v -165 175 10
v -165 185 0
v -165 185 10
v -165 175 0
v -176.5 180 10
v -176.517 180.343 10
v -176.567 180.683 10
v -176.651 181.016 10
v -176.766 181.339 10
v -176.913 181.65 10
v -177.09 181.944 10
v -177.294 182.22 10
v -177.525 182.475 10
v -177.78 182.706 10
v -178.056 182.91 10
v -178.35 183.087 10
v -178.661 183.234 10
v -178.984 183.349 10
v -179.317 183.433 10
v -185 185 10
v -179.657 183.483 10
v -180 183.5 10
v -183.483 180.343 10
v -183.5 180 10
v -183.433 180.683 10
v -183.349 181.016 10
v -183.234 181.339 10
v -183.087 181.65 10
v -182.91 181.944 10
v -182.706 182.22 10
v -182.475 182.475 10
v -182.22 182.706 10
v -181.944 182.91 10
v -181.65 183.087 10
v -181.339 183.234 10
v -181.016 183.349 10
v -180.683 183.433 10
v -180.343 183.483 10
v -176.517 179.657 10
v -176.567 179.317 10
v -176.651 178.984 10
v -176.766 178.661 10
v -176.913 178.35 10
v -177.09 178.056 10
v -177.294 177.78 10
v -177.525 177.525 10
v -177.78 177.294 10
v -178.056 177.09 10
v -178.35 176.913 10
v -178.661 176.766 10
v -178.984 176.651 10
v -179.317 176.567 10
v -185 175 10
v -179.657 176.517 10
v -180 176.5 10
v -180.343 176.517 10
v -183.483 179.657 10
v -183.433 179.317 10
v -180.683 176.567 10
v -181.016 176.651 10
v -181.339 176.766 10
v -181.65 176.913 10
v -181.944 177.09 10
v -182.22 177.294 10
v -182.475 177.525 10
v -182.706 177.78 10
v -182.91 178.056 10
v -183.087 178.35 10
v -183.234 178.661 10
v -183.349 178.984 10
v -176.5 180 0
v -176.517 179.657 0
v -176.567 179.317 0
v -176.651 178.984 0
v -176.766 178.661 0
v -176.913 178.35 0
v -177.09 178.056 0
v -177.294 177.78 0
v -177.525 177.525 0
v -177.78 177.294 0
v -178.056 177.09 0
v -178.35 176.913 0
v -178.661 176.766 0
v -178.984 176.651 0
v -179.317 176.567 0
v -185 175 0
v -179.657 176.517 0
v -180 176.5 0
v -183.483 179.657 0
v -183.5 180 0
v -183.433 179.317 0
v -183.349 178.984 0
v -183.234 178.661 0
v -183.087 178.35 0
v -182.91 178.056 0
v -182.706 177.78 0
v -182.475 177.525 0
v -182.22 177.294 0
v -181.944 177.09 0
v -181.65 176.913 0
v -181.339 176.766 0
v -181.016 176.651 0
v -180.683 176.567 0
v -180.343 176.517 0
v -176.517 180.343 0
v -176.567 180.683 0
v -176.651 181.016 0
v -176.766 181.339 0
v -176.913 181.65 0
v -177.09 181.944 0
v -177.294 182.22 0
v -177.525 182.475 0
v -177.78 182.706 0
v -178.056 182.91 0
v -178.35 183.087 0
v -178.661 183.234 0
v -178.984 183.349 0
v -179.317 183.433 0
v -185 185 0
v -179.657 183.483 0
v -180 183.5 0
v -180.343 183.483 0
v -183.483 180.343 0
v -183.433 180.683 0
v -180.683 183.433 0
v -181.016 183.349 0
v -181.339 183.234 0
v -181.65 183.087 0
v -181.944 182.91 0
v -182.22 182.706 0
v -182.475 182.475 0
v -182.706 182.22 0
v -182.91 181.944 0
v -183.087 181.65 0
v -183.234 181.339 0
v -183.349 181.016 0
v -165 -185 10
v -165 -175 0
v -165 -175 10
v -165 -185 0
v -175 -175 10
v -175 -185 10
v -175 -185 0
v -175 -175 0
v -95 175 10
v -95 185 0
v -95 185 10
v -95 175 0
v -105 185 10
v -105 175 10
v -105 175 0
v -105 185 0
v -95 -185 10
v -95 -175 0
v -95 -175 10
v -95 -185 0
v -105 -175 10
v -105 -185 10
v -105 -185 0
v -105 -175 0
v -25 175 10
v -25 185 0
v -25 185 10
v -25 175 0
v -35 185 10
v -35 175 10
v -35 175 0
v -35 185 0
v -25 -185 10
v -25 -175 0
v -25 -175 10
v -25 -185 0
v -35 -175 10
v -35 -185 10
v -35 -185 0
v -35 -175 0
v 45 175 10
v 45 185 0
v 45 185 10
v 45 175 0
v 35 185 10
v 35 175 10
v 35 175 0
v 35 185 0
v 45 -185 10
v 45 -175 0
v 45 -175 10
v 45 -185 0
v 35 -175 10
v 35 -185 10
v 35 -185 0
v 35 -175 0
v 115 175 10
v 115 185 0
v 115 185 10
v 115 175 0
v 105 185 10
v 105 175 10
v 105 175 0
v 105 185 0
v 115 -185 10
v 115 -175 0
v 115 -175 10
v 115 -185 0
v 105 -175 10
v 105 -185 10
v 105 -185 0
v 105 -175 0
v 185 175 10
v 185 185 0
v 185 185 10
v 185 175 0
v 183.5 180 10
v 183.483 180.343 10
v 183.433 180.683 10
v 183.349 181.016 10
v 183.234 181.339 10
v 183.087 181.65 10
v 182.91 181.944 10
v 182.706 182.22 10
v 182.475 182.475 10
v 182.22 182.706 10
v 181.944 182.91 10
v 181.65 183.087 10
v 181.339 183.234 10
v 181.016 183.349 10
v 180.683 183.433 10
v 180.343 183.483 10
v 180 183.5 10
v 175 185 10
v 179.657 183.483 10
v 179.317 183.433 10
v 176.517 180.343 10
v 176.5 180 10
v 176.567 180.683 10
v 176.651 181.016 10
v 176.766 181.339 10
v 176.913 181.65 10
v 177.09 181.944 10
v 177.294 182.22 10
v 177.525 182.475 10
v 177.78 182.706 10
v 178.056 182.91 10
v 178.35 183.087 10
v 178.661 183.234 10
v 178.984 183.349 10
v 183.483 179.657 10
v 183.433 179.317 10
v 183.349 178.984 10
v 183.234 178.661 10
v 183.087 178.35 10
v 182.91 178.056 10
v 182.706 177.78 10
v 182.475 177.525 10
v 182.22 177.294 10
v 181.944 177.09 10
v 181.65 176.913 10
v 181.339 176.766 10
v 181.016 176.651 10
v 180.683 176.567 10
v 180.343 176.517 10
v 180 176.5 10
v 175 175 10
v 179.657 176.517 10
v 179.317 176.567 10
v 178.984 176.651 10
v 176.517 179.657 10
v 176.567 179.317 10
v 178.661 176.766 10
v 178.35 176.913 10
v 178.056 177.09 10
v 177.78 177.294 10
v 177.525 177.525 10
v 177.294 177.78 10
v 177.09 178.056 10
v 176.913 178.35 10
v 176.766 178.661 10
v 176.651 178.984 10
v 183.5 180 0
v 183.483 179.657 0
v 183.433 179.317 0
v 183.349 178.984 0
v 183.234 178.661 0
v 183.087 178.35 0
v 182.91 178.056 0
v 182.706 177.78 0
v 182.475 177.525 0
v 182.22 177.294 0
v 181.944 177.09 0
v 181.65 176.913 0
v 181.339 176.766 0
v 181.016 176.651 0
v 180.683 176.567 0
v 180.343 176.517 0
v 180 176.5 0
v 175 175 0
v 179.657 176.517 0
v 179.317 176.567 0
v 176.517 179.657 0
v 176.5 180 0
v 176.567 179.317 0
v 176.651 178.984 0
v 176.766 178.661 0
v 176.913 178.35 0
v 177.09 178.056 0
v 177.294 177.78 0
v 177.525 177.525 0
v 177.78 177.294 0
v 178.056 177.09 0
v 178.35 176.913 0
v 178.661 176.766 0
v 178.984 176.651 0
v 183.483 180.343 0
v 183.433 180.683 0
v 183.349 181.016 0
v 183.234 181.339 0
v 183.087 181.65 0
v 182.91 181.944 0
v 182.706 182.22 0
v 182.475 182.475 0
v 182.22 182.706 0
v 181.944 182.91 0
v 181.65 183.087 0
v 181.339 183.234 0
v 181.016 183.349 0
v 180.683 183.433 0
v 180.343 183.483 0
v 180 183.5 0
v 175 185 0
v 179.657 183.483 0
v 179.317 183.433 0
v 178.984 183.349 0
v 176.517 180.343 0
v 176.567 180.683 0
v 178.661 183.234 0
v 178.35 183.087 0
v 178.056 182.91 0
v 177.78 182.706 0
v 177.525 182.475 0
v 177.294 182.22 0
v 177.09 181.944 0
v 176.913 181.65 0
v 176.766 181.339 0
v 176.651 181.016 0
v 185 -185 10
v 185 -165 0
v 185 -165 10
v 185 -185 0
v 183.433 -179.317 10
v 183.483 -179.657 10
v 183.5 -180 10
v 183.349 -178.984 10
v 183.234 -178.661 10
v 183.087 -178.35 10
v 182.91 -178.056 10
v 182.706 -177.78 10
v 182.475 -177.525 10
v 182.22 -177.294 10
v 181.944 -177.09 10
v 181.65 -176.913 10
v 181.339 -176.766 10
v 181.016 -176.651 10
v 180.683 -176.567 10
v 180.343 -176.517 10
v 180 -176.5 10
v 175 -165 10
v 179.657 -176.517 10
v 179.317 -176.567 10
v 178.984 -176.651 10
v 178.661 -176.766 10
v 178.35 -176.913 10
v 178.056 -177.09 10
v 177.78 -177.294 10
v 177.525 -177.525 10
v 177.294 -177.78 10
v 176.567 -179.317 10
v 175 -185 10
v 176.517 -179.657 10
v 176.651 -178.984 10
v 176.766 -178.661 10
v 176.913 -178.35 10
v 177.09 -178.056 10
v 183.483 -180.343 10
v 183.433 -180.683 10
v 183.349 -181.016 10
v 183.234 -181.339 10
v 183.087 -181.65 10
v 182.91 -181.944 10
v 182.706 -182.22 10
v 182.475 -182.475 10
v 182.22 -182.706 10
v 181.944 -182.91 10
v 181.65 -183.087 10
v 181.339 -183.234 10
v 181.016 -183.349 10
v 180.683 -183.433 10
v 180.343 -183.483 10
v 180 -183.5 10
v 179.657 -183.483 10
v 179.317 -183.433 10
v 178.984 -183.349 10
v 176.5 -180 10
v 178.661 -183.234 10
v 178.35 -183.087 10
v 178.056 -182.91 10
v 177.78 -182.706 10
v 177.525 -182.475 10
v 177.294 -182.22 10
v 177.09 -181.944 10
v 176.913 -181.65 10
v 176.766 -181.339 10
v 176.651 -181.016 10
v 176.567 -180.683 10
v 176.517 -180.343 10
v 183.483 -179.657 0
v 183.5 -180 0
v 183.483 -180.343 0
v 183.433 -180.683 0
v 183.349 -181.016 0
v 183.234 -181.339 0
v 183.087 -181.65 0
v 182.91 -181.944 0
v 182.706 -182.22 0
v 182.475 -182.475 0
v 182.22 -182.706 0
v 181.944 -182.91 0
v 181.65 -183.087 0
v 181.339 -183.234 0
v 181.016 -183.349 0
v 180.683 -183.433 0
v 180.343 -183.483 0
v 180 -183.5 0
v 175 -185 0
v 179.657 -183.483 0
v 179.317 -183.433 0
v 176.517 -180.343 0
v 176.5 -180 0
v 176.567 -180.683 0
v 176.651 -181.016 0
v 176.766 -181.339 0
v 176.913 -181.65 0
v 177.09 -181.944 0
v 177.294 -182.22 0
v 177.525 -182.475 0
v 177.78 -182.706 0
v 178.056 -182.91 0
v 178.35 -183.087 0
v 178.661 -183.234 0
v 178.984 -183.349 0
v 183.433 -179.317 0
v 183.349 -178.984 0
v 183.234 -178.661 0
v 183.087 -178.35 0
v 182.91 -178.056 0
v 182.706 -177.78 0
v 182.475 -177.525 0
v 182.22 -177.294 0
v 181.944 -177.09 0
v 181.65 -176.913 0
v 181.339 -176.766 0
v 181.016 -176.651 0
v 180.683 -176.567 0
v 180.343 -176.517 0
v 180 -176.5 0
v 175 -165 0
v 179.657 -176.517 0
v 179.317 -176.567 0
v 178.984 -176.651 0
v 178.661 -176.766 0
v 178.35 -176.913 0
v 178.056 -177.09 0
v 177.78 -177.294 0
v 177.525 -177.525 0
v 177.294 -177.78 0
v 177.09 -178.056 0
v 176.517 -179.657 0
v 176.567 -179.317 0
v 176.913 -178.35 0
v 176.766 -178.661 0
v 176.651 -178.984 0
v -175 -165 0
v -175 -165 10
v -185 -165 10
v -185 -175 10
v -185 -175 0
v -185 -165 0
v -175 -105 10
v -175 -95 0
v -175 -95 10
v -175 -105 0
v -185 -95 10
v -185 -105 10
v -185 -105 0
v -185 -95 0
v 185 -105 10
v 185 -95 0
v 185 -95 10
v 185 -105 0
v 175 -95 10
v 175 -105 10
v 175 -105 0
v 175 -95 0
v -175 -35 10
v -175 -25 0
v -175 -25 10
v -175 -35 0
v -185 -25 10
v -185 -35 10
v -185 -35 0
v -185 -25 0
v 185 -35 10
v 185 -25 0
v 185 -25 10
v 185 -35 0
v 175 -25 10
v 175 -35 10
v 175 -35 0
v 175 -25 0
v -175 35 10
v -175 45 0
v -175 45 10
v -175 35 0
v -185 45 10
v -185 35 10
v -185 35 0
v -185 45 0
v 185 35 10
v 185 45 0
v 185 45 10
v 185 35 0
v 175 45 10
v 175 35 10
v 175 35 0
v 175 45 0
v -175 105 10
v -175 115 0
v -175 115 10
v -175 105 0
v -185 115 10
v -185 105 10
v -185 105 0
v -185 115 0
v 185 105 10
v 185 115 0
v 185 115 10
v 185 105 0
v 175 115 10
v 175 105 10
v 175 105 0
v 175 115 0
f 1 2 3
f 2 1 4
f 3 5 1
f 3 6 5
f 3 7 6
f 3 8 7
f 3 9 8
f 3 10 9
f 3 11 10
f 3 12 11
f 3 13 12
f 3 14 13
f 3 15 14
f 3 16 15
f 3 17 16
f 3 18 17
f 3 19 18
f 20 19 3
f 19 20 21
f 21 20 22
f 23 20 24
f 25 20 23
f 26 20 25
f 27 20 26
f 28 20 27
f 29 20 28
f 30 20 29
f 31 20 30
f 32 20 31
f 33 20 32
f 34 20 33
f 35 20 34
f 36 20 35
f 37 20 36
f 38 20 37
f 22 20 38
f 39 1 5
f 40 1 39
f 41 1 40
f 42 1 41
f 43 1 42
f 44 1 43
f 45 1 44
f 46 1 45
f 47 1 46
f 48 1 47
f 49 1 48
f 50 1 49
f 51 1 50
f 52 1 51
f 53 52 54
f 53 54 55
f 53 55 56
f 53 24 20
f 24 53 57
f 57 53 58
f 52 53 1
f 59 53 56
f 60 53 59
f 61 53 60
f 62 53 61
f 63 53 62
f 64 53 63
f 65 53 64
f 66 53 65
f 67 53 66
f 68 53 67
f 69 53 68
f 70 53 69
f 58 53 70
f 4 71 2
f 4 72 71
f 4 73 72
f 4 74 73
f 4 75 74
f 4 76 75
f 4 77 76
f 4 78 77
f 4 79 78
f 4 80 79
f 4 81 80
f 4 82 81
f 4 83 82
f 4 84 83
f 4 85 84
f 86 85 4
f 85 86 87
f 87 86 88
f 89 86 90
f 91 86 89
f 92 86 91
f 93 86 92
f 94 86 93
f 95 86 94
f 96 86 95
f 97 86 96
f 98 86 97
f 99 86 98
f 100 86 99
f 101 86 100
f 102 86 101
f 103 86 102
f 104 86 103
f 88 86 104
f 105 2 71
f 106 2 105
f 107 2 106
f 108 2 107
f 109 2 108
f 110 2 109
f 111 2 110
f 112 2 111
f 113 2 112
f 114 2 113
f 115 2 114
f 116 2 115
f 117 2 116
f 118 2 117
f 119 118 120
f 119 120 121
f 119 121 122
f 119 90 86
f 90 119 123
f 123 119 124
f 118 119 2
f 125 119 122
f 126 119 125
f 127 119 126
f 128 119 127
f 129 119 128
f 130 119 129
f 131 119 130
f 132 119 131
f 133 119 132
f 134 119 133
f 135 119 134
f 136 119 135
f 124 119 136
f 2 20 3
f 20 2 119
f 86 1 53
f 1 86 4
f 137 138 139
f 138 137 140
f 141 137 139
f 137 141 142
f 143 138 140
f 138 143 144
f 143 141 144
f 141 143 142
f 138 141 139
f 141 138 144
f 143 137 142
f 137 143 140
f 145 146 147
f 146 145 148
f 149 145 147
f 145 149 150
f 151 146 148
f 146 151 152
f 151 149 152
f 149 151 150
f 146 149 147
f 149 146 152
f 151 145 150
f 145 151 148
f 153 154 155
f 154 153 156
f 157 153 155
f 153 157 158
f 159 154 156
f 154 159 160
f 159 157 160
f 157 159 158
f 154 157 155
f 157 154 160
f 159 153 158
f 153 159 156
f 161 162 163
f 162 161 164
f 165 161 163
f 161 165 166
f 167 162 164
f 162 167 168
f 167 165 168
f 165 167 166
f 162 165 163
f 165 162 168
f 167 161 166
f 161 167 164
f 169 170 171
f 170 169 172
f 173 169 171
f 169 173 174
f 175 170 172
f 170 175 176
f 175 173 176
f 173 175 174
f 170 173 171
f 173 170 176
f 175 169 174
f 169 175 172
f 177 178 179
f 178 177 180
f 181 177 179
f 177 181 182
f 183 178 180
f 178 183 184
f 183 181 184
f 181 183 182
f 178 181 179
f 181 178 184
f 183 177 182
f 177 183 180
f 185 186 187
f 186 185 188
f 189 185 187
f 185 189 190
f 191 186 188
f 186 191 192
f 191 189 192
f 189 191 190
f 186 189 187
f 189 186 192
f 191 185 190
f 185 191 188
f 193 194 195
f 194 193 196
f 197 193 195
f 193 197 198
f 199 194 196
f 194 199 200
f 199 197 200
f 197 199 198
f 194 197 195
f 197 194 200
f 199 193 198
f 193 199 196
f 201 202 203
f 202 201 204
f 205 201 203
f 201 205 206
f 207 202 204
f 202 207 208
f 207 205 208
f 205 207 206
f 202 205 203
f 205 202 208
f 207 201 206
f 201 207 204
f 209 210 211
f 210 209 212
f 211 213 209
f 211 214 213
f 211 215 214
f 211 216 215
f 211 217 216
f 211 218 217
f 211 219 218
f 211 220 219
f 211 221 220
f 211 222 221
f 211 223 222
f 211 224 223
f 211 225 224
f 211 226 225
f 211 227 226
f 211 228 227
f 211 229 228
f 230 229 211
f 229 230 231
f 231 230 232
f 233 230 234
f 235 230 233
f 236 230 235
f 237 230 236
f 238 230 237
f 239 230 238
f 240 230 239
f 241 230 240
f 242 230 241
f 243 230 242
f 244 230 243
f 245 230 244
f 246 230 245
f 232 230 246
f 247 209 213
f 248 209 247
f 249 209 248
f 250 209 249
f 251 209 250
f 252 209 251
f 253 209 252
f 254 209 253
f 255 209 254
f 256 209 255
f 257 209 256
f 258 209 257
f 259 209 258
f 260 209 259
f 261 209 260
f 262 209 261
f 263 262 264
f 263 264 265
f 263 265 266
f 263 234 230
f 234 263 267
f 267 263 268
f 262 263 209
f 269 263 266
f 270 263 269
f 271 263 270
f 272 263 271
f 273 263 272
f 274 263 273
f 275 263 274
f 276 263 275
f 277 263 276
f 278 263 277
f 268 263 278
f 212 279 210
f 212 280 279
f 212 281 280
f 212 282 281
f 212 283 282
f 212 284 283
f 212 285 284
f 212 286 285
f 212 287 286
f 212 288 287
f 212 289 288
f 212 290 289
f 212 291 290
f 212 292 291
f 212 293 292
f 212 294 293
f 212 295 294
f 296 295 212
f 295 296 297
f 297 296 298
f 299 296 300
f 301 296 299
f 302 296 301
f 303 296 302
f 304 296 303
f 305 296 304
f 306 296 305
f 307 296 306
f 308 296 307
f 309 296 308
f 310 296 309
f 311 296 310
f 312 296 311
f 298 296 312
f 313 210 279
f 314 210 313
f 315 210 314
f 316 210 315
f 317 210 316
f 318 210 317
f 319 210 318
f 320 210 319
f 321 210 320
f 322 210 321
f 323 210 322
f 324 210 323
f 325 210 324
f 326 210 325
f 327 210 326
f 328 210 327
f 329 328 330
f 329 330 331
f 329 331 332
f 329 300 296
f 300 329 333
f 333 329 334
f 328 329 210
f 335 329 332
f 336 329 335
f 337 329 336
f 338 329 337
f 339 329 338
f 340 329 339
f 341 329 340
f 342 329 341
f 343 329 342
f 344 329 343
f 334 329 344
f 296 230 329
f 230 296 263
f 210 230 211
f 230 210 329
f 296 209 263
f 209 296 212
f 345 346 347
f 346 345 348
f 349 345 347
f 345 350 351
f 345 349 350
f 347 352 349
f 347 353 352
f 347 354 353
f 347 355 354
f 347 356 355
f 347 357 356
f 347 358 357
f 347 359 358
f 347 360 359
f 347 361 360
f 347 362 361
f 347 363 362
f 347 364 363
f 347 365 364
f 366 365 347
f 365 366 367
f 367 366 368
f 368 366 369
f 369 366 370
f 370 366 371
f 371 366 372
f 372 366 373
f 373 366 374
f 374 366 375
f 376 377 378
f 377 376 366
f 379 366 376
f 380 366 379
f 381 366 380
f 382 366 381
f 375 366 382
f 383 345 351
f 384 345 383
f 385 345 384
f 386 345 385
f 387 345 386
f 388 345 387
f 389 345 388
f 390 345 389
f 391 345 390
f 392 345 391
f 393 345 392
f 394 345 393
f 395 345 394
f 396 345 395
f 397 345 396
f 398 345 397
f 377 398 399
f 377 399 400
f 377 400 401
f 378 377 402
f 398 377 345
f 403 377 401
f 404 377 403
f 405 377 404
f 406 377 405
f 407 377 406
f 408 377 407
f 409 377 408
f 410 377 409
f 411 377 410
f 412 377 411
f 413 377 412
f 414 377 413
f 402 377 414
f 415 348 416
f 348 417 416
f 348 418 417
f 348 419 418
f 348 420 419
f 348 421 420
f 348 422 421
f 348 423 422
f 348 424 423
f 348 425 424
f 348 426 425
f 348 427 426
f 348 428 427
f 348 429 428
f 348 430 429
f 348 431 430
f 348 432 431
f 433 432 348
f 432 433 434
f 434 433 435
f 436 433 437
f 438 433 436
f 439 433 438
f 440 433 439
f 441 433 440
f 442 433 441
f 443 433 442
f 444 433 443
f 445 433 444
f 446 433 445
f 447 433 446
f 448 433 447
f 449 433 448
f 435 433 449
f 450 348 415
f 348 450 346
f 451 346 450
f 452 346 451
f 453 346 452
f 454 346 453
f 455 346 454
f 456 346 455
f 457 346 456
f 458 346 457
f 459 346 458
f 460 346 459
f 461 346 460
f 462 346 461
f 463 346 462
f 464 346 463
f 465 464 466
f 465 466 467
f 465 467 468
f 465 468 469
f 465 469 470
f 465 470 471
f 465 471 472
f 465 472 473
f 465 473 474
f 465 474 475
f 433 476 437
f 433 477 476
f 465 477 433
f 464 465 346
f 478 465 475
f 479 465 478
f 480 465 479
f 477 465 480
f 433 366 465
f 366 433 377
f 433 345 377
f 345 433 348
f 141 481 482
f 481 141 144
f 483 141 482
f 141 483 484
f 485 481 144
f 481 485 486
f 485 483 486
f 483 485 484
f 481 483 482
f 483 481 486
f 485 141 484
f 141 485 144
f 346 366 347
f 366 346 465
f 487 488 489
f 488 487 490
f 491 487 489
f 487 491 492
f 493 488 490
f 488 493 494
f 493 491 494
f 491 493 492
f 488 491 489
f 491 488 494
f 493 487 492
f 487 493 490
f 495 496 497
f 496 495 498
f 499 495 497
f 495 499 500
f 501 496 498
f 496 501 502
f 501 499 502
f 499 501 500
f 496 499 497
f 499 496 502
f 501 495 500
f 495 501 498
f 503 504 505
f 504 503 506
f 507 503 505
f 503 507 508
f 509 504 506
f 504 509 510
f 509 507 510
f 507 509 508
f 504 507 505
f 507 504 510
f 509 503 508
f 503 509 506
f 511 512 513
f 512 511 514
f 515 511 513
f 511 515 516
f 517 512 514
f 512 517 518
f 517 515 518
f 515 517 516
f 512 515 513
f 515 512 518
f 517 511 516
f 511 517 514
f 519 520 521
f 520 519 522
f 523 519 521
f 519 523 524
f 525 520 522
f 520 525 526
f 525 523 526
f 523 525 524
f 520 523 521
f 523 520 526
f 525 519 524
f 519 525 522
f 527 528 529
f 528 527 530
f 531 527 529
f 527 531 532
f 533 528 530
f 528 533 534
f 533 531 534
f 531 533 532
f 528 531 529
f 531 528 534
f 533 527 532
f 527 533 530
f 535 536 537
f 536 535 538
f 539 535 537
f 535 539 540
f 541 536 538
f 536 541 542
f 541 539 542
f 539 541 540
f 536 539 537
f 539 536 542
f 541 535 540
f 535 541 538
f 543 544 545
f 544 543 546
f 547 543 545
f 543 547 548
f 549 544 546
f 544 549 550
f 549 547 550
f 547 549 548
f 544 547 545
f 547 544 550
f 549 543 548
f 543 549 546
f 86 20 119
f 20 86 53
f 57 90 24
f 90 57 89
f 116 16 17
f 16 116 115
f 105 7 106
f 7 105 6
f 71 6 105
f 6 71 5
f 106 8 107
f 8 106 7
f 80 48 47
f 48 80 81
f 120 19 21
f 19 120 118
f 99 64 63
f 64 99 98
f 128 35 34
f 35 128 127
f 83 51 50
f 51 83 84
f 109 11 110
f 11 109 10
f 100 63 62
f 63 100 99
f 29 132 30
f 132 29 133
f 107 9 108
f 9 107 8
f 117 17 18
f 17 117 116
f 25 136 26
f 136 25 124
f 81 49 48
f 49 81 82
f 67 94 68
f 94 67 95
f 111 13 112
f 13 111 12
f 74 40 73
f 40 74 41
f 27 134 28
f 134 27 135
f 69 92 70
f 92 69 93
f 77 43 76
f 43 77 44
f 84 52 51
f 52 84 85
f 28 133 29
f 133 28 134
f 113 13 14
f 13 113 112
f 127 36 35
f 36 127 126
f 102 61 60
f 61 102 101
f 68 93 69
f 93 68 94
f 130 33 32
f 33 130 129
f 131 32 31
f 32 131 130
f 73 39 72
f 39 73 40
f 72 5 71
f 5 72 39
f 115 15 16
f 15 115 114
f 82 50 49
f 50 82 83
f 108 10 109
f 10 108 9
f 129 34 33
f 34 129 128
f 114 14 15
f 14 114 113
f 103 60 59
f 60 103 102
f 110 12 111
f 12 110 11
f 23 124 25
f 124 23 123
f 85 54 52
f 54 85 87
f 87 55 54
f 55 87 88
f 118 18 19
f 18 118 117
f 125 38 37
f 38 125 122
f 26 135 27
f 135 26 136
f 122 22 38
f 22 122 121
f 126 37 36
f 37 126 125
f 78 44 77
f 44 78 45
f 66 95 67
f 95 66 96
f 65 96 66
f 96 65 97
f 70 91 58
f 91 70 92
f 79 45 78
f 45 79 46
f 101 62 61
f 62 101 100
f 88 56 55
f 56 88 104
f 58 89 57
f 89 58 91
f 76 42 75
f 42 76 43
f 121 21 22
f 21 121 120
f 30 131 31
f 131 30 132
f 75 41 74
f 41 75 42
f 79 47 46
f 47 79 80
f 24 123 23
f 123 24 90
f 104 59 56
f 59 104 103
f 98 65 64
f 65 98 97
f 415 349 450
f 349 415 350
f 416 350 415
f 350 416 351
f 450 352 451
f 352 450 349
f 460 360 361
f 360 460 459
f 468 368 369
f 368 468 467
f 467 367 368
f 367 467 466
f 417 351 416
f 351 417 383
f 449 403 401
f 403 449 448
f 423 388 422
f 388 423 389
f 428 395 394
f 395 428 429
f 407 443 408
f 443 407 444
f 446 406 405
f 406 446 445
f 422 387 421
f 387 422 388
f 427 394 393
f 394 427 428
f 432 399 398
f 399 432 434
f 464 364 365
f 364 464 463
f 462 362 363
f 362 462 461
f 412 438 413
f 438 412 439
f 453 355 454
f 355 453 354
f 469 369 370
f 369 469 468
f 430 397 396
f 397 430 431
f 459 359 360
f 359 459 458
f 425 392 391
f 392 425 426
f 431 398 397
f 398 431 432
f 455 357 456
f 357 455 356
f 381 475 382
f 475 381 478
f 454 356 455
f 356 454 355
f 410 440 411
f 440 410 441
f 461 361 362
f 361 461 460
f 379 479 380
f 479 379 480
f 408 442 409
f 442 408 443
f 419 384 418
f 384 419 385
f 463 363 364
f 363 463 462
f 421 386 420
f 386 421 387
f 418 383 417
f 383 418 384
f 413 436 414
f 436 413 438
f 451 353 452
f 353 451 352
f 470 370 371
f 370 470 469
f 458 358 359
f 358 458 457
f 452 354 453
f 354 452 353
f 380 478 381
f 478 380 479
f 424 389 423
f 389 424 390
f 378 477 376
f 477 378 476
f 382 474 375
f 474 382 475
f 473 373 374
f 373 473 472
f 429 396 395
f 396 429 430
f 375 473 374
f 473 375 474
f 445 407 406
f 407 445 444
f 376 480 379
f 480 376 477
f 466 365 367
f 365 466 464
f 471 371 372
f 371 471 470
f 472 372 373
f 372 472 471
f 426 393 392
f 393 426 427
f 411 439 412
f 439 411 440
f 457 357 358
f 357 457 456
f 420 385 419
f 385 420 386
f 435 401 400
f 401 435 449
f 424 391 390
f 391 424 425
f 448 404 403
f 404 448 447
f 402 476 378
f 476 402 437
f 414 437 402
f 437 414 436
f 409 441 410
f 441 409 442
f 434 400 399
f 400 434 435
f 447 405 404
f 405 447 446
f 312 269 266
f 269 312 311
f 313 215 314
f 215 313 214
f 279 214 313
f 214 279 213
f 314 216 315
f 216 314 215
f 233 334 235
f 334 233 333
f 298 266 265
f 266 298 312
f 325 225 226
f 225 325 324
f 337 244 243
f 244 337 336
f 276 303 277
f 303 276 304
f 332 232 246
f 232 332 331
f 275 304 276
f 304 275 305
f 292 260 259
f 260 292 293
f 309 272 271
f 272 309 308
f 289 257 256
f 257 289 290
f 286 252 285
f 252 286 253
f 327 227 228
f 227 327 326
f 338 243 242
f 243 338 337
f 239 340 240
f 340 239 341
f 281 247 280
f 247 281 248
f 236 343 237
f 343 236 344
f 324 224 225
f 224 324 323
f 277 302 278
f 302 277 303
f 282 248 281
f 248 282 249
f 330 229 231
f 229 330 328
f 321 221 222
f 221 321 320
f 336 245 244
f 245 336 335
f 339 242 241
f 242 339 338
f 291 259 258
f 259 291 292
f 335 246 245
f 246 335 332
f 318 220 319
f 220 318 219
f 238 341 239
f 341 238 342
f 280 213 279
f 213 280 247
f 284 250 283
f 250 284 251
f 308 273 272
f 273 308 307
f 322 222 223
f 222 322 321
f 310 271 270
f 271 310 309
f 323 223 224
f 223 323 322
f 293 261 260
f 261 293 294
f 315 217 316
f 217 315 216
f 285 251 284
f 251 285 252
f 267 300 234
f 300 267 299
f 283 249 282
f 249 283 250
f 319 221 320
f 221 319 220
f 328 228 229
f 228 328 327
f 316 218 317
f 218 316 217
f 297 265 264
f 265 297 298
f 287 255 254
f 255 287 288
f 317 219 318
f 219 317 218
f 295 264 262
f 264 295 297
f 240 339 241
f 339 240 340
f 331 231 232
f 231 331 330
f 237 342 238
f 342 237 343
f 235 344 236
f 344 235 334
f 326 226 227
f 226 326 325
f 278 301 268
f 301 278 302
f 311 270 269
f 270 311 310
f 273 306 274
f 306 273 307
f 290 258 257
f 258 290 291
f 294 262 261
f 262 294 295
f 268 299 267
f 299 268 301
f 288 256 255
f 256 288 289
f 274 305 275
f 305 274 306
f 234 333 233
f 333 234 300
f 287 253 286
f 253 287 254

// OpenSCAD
// ring_05.scad - ring index 5 (z bottom = 50 mm)
$fn = 64; bar = 10; half_b = bar/2; outer = 370; half_outer = outer/2;
front_y = 180; back_y = -180; left_x = -180; right_x = 180;
x_centers = [-170, -100, -30, 40, 110, 180];
z_centers = [5, 85, 155, 225, 295, 365, 435, 505, 575, 645, 715]; ring_z = 50;
module place_box(cx, cy, sx, sy) { translate([cx - sx/2, cy - sy/2, 0]) cube([sx, sy, bar]); }

difference() { union() {
    for (x = x_centers) { place_box(x, front_y, bar, bar); place_box(x, back_y, bar, bar); }
    for (y = x_centers) { place_box(left_x, y, bar, bar); place_box(right_x, y, bar, bar); }
    for (zc = z_centers) if ((zc - half_b < ring_z + bar) && (zc + half_b > ring_z)) {
        translate([-half_outer, front_y - half_b, 0]) cube([outer, bar, bar]);
        translate([-half_outer, back_y - half_b, 0])  cube([outer, bar, bar]);
        translate([left_x - half_b, -half_outer, 0])  cube([bar, outer, bar]);
        translate([right_x - half_b, -half_outer, 0]) cube([bar, outer, bar]);
    }
  }
  for (cx = [-180, 180]) for (cy = [-180, 180]) translate([cx, cy, 0]) cylinder(h = bar, r = 3.5, $fn = 64);
}
